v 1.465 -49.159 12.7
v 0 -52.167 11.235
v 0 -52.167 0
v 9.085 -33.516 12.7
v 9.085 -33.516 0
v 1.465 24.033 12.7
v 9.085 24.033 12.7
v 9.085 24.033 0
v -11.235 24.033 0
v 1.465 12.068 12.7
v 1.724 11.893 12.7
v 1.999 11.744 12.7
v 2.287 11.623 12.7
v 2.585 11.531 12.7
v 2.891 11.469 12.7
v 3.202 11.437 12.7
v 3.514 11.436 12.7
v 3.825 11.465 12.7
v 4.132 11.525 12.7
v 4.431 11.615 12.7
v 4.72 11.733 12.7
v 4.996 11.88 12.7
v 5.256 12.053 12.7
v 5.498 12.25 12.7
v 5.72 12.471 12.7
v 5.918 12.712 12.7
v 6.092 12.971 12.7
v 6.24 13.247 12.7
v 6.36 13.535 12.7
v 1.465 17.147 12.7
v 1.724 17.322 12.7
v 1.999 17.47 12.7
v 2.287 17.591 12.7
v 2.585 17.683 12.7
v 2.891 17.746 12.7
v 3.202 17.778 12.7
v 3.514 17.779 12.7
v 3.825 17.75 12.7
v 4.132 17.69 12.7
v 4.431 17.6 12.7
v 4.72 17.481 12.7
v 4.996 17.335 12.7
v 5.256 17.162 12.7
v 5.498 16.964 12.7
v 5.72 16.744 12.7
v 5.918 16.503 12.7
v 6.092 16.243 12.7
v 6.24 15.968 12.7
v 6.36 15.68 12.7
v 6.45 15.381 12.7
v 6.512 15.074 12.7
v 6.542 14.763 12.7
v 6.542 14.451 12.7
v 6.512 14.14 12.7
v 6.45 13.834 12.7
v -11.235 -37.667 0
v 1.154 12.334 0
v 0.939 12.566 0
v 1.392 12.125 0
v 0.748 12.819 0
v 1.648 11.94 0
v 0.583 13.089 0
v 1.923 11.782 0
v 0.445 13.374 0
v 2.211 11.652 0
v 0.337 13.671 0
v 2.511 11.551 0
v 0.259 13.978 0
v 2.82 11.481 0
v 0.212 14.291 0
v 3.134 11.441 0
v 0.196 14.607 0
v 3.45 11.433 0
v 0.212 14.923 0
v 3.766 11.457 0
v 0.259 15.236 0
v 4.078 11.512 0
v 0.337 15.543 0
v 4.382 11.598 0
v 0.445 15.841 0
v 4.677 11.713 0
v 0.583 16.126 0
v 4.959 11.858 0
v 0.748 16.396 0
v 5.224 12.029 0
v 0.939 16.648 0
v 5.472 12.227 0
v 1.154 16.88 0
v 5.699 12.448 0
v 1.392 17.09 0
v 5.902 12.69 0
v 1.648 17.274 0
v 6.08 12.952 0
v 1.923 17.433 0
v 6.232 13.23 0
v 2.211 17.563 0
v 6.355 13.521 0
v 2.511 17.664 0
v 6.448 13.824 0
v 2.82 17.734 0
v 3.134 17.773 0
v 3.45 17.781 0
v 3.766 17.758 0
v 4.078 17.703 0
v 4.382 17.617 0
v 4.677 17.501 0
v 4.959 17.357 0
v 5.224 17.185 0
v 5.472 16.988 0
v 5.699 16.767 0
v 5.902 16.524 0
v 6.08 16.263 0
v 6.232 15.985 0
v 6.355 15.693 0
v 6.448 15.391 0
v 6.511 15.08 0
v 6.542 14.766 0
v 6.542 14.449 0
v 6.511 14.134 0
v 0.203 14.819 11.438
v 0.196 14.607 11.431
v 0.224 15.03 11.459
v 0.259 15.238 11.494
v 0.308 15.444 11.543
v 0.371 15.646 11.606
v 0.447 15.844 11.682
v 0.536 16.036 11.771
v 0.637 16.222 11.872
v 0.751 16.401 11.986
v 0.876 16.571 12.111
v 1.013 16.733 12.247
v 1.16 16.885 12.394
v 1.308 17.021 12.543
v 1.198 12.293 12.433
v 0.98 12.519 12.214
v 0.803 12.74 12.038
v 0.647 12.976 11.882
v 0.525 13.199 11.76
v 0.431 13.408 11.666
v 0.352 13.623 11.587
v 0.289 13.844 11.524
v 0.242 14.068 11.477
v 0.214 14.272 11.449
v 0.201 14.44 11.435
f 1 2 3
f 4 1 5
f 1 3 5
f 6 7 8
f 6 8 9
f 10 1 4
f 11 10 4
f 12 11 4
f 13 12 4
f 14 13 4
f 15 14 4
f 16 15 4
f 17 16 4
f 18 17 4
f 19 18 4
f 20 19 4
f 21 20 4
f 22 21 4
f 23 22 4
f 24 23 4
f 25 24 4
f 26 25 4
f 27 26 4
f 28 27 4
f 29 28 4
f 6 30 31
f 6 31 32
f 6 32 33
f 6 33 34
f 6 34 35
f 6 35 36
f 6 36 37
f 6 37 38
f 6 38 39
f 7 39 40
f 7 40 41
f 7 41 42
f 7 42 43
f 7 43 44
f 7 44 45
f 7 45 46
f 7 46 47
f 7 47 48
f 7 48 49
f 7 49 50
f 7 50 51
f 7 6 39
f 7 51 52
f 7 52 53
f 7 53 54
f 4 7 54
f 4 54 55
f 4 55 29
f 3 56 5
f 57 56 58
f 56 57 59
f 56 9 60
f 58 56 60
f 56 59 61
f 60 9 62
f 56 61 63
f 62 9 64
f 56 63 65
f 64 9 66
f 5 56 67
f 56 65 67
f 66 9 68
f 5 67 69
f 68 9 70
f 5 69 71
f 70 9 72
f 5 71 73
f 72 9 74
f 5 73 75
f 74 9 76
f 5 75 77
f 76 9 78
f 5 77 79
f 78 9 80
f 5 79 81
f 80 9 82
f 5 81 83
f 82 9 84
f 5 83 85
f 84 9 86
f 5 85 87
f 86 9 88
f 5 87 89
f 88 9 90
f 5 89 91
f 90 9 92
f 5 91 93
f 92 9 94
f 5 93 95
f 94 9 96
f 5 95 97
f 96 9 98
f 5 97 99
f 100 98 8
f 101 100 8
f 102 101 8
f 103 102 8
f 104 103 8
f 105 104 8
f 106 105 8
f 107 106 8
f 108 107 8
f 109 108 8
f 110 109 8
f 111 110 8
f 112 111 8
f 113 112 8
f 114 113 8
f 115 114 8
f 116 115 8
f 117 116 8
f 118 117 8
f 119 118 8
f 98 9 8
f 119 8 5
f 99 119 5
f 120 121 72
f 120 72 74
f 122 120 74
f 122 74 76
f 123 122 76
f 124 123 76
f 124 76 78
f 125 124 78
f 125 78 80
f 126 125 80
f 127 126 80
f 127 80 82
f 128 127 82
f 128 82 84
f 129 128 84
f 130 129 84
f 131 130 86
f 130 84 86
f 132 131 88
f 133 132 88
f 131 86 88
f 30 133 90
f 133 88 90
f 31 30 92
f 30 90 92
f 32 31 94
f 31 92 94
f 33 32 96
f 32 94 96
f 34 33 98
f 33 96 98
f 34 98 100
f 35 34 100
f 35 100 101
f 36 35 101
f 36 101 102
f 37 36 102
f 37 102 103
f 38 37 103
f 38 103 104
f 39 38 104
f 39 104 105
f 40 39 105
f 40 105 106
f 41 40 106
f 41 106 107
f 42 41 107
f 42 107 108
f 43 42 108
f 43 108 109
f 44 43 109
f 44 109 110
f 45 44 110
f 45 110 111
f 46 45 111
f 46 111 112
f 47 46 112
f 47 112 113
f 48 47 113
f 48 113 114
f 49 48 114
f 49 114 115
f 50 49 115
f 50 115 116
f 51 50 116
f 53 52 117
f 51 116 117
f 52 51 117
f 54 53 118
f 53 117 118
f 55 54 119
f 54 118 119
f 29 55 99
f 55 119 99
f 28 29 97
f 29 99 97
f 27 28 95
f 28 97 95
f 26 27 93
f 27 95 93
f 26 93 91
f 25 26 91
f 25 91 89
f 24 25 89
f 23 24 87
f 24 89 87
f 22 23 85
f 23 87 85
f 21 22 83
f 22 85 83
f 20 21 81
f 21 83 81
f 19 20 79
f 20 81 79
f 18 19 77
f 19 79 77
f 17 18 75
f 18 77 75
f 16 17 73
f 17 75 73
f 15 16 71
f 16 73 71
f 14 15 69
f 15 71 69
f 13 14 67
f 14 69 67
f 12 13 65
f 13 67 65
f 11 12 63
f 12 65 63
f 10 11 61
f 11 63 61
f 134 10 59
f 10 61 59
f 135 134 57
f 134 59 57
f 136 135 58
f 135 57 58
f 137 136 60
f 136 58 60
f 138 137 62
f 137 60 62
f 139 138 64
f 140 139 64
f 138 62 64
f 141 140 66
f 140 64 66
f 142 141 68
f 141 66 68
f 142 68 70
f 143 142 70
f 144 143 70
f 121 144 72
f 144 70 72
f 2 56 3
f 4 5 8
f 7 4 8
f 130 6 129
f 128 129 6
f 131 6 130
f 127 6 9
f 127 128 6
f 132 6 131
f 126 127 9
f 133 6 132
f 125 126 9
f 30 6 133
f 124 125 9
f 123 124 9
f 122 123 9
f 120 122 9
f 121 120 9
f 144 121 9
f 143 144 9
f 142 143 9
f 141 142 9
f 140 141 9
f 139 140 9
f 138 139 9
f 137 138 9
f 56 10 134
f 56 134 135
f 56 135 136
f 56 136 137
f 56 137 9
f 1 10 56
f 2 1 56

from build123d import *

# Parameters (mm, degrees)
F1_DEPTH = 12.7
F2_SIZE  = 12.69999
F4_D     = 6.35


# Not quite as in the source:
# - a fillet or chamfer is up to 0.001 mm smaller than in the source, because OpenCascade refuses the exact size


with BuildPart() as f1:
    # F0 (on Top) → F1 (new body)
    with BuildSketch(Plane.XY):
        Polygon((9.0852697523, 24.0329056978), (-11.2347302477, 24.0329056978), (-11.2347302477, 0), (-11.2347302477, -37.6667892456), (0, -52.1670943022), (9.0852697523, -33.5160031522), align=None)
    extrude(amount=F1_DEPTH)

    # F2 (size 12.7 in the source; OpenCascade refuses exactly that, so slightly less here)
    f2_edges = [f1.edges().sort_by_distance(p)[0] for p in [
        (-11.23473, -6.816942, 12.7),
    ]]
    chamfer(f2_edges, length=F2_SIZE)

    # F4 (through all)
    with Locations(Plane.XY.offset(12.7)):
        with Locations((3.3710829448, 14.6072776988)):
            Hole(F4_D / 2)


solid = f1.part
